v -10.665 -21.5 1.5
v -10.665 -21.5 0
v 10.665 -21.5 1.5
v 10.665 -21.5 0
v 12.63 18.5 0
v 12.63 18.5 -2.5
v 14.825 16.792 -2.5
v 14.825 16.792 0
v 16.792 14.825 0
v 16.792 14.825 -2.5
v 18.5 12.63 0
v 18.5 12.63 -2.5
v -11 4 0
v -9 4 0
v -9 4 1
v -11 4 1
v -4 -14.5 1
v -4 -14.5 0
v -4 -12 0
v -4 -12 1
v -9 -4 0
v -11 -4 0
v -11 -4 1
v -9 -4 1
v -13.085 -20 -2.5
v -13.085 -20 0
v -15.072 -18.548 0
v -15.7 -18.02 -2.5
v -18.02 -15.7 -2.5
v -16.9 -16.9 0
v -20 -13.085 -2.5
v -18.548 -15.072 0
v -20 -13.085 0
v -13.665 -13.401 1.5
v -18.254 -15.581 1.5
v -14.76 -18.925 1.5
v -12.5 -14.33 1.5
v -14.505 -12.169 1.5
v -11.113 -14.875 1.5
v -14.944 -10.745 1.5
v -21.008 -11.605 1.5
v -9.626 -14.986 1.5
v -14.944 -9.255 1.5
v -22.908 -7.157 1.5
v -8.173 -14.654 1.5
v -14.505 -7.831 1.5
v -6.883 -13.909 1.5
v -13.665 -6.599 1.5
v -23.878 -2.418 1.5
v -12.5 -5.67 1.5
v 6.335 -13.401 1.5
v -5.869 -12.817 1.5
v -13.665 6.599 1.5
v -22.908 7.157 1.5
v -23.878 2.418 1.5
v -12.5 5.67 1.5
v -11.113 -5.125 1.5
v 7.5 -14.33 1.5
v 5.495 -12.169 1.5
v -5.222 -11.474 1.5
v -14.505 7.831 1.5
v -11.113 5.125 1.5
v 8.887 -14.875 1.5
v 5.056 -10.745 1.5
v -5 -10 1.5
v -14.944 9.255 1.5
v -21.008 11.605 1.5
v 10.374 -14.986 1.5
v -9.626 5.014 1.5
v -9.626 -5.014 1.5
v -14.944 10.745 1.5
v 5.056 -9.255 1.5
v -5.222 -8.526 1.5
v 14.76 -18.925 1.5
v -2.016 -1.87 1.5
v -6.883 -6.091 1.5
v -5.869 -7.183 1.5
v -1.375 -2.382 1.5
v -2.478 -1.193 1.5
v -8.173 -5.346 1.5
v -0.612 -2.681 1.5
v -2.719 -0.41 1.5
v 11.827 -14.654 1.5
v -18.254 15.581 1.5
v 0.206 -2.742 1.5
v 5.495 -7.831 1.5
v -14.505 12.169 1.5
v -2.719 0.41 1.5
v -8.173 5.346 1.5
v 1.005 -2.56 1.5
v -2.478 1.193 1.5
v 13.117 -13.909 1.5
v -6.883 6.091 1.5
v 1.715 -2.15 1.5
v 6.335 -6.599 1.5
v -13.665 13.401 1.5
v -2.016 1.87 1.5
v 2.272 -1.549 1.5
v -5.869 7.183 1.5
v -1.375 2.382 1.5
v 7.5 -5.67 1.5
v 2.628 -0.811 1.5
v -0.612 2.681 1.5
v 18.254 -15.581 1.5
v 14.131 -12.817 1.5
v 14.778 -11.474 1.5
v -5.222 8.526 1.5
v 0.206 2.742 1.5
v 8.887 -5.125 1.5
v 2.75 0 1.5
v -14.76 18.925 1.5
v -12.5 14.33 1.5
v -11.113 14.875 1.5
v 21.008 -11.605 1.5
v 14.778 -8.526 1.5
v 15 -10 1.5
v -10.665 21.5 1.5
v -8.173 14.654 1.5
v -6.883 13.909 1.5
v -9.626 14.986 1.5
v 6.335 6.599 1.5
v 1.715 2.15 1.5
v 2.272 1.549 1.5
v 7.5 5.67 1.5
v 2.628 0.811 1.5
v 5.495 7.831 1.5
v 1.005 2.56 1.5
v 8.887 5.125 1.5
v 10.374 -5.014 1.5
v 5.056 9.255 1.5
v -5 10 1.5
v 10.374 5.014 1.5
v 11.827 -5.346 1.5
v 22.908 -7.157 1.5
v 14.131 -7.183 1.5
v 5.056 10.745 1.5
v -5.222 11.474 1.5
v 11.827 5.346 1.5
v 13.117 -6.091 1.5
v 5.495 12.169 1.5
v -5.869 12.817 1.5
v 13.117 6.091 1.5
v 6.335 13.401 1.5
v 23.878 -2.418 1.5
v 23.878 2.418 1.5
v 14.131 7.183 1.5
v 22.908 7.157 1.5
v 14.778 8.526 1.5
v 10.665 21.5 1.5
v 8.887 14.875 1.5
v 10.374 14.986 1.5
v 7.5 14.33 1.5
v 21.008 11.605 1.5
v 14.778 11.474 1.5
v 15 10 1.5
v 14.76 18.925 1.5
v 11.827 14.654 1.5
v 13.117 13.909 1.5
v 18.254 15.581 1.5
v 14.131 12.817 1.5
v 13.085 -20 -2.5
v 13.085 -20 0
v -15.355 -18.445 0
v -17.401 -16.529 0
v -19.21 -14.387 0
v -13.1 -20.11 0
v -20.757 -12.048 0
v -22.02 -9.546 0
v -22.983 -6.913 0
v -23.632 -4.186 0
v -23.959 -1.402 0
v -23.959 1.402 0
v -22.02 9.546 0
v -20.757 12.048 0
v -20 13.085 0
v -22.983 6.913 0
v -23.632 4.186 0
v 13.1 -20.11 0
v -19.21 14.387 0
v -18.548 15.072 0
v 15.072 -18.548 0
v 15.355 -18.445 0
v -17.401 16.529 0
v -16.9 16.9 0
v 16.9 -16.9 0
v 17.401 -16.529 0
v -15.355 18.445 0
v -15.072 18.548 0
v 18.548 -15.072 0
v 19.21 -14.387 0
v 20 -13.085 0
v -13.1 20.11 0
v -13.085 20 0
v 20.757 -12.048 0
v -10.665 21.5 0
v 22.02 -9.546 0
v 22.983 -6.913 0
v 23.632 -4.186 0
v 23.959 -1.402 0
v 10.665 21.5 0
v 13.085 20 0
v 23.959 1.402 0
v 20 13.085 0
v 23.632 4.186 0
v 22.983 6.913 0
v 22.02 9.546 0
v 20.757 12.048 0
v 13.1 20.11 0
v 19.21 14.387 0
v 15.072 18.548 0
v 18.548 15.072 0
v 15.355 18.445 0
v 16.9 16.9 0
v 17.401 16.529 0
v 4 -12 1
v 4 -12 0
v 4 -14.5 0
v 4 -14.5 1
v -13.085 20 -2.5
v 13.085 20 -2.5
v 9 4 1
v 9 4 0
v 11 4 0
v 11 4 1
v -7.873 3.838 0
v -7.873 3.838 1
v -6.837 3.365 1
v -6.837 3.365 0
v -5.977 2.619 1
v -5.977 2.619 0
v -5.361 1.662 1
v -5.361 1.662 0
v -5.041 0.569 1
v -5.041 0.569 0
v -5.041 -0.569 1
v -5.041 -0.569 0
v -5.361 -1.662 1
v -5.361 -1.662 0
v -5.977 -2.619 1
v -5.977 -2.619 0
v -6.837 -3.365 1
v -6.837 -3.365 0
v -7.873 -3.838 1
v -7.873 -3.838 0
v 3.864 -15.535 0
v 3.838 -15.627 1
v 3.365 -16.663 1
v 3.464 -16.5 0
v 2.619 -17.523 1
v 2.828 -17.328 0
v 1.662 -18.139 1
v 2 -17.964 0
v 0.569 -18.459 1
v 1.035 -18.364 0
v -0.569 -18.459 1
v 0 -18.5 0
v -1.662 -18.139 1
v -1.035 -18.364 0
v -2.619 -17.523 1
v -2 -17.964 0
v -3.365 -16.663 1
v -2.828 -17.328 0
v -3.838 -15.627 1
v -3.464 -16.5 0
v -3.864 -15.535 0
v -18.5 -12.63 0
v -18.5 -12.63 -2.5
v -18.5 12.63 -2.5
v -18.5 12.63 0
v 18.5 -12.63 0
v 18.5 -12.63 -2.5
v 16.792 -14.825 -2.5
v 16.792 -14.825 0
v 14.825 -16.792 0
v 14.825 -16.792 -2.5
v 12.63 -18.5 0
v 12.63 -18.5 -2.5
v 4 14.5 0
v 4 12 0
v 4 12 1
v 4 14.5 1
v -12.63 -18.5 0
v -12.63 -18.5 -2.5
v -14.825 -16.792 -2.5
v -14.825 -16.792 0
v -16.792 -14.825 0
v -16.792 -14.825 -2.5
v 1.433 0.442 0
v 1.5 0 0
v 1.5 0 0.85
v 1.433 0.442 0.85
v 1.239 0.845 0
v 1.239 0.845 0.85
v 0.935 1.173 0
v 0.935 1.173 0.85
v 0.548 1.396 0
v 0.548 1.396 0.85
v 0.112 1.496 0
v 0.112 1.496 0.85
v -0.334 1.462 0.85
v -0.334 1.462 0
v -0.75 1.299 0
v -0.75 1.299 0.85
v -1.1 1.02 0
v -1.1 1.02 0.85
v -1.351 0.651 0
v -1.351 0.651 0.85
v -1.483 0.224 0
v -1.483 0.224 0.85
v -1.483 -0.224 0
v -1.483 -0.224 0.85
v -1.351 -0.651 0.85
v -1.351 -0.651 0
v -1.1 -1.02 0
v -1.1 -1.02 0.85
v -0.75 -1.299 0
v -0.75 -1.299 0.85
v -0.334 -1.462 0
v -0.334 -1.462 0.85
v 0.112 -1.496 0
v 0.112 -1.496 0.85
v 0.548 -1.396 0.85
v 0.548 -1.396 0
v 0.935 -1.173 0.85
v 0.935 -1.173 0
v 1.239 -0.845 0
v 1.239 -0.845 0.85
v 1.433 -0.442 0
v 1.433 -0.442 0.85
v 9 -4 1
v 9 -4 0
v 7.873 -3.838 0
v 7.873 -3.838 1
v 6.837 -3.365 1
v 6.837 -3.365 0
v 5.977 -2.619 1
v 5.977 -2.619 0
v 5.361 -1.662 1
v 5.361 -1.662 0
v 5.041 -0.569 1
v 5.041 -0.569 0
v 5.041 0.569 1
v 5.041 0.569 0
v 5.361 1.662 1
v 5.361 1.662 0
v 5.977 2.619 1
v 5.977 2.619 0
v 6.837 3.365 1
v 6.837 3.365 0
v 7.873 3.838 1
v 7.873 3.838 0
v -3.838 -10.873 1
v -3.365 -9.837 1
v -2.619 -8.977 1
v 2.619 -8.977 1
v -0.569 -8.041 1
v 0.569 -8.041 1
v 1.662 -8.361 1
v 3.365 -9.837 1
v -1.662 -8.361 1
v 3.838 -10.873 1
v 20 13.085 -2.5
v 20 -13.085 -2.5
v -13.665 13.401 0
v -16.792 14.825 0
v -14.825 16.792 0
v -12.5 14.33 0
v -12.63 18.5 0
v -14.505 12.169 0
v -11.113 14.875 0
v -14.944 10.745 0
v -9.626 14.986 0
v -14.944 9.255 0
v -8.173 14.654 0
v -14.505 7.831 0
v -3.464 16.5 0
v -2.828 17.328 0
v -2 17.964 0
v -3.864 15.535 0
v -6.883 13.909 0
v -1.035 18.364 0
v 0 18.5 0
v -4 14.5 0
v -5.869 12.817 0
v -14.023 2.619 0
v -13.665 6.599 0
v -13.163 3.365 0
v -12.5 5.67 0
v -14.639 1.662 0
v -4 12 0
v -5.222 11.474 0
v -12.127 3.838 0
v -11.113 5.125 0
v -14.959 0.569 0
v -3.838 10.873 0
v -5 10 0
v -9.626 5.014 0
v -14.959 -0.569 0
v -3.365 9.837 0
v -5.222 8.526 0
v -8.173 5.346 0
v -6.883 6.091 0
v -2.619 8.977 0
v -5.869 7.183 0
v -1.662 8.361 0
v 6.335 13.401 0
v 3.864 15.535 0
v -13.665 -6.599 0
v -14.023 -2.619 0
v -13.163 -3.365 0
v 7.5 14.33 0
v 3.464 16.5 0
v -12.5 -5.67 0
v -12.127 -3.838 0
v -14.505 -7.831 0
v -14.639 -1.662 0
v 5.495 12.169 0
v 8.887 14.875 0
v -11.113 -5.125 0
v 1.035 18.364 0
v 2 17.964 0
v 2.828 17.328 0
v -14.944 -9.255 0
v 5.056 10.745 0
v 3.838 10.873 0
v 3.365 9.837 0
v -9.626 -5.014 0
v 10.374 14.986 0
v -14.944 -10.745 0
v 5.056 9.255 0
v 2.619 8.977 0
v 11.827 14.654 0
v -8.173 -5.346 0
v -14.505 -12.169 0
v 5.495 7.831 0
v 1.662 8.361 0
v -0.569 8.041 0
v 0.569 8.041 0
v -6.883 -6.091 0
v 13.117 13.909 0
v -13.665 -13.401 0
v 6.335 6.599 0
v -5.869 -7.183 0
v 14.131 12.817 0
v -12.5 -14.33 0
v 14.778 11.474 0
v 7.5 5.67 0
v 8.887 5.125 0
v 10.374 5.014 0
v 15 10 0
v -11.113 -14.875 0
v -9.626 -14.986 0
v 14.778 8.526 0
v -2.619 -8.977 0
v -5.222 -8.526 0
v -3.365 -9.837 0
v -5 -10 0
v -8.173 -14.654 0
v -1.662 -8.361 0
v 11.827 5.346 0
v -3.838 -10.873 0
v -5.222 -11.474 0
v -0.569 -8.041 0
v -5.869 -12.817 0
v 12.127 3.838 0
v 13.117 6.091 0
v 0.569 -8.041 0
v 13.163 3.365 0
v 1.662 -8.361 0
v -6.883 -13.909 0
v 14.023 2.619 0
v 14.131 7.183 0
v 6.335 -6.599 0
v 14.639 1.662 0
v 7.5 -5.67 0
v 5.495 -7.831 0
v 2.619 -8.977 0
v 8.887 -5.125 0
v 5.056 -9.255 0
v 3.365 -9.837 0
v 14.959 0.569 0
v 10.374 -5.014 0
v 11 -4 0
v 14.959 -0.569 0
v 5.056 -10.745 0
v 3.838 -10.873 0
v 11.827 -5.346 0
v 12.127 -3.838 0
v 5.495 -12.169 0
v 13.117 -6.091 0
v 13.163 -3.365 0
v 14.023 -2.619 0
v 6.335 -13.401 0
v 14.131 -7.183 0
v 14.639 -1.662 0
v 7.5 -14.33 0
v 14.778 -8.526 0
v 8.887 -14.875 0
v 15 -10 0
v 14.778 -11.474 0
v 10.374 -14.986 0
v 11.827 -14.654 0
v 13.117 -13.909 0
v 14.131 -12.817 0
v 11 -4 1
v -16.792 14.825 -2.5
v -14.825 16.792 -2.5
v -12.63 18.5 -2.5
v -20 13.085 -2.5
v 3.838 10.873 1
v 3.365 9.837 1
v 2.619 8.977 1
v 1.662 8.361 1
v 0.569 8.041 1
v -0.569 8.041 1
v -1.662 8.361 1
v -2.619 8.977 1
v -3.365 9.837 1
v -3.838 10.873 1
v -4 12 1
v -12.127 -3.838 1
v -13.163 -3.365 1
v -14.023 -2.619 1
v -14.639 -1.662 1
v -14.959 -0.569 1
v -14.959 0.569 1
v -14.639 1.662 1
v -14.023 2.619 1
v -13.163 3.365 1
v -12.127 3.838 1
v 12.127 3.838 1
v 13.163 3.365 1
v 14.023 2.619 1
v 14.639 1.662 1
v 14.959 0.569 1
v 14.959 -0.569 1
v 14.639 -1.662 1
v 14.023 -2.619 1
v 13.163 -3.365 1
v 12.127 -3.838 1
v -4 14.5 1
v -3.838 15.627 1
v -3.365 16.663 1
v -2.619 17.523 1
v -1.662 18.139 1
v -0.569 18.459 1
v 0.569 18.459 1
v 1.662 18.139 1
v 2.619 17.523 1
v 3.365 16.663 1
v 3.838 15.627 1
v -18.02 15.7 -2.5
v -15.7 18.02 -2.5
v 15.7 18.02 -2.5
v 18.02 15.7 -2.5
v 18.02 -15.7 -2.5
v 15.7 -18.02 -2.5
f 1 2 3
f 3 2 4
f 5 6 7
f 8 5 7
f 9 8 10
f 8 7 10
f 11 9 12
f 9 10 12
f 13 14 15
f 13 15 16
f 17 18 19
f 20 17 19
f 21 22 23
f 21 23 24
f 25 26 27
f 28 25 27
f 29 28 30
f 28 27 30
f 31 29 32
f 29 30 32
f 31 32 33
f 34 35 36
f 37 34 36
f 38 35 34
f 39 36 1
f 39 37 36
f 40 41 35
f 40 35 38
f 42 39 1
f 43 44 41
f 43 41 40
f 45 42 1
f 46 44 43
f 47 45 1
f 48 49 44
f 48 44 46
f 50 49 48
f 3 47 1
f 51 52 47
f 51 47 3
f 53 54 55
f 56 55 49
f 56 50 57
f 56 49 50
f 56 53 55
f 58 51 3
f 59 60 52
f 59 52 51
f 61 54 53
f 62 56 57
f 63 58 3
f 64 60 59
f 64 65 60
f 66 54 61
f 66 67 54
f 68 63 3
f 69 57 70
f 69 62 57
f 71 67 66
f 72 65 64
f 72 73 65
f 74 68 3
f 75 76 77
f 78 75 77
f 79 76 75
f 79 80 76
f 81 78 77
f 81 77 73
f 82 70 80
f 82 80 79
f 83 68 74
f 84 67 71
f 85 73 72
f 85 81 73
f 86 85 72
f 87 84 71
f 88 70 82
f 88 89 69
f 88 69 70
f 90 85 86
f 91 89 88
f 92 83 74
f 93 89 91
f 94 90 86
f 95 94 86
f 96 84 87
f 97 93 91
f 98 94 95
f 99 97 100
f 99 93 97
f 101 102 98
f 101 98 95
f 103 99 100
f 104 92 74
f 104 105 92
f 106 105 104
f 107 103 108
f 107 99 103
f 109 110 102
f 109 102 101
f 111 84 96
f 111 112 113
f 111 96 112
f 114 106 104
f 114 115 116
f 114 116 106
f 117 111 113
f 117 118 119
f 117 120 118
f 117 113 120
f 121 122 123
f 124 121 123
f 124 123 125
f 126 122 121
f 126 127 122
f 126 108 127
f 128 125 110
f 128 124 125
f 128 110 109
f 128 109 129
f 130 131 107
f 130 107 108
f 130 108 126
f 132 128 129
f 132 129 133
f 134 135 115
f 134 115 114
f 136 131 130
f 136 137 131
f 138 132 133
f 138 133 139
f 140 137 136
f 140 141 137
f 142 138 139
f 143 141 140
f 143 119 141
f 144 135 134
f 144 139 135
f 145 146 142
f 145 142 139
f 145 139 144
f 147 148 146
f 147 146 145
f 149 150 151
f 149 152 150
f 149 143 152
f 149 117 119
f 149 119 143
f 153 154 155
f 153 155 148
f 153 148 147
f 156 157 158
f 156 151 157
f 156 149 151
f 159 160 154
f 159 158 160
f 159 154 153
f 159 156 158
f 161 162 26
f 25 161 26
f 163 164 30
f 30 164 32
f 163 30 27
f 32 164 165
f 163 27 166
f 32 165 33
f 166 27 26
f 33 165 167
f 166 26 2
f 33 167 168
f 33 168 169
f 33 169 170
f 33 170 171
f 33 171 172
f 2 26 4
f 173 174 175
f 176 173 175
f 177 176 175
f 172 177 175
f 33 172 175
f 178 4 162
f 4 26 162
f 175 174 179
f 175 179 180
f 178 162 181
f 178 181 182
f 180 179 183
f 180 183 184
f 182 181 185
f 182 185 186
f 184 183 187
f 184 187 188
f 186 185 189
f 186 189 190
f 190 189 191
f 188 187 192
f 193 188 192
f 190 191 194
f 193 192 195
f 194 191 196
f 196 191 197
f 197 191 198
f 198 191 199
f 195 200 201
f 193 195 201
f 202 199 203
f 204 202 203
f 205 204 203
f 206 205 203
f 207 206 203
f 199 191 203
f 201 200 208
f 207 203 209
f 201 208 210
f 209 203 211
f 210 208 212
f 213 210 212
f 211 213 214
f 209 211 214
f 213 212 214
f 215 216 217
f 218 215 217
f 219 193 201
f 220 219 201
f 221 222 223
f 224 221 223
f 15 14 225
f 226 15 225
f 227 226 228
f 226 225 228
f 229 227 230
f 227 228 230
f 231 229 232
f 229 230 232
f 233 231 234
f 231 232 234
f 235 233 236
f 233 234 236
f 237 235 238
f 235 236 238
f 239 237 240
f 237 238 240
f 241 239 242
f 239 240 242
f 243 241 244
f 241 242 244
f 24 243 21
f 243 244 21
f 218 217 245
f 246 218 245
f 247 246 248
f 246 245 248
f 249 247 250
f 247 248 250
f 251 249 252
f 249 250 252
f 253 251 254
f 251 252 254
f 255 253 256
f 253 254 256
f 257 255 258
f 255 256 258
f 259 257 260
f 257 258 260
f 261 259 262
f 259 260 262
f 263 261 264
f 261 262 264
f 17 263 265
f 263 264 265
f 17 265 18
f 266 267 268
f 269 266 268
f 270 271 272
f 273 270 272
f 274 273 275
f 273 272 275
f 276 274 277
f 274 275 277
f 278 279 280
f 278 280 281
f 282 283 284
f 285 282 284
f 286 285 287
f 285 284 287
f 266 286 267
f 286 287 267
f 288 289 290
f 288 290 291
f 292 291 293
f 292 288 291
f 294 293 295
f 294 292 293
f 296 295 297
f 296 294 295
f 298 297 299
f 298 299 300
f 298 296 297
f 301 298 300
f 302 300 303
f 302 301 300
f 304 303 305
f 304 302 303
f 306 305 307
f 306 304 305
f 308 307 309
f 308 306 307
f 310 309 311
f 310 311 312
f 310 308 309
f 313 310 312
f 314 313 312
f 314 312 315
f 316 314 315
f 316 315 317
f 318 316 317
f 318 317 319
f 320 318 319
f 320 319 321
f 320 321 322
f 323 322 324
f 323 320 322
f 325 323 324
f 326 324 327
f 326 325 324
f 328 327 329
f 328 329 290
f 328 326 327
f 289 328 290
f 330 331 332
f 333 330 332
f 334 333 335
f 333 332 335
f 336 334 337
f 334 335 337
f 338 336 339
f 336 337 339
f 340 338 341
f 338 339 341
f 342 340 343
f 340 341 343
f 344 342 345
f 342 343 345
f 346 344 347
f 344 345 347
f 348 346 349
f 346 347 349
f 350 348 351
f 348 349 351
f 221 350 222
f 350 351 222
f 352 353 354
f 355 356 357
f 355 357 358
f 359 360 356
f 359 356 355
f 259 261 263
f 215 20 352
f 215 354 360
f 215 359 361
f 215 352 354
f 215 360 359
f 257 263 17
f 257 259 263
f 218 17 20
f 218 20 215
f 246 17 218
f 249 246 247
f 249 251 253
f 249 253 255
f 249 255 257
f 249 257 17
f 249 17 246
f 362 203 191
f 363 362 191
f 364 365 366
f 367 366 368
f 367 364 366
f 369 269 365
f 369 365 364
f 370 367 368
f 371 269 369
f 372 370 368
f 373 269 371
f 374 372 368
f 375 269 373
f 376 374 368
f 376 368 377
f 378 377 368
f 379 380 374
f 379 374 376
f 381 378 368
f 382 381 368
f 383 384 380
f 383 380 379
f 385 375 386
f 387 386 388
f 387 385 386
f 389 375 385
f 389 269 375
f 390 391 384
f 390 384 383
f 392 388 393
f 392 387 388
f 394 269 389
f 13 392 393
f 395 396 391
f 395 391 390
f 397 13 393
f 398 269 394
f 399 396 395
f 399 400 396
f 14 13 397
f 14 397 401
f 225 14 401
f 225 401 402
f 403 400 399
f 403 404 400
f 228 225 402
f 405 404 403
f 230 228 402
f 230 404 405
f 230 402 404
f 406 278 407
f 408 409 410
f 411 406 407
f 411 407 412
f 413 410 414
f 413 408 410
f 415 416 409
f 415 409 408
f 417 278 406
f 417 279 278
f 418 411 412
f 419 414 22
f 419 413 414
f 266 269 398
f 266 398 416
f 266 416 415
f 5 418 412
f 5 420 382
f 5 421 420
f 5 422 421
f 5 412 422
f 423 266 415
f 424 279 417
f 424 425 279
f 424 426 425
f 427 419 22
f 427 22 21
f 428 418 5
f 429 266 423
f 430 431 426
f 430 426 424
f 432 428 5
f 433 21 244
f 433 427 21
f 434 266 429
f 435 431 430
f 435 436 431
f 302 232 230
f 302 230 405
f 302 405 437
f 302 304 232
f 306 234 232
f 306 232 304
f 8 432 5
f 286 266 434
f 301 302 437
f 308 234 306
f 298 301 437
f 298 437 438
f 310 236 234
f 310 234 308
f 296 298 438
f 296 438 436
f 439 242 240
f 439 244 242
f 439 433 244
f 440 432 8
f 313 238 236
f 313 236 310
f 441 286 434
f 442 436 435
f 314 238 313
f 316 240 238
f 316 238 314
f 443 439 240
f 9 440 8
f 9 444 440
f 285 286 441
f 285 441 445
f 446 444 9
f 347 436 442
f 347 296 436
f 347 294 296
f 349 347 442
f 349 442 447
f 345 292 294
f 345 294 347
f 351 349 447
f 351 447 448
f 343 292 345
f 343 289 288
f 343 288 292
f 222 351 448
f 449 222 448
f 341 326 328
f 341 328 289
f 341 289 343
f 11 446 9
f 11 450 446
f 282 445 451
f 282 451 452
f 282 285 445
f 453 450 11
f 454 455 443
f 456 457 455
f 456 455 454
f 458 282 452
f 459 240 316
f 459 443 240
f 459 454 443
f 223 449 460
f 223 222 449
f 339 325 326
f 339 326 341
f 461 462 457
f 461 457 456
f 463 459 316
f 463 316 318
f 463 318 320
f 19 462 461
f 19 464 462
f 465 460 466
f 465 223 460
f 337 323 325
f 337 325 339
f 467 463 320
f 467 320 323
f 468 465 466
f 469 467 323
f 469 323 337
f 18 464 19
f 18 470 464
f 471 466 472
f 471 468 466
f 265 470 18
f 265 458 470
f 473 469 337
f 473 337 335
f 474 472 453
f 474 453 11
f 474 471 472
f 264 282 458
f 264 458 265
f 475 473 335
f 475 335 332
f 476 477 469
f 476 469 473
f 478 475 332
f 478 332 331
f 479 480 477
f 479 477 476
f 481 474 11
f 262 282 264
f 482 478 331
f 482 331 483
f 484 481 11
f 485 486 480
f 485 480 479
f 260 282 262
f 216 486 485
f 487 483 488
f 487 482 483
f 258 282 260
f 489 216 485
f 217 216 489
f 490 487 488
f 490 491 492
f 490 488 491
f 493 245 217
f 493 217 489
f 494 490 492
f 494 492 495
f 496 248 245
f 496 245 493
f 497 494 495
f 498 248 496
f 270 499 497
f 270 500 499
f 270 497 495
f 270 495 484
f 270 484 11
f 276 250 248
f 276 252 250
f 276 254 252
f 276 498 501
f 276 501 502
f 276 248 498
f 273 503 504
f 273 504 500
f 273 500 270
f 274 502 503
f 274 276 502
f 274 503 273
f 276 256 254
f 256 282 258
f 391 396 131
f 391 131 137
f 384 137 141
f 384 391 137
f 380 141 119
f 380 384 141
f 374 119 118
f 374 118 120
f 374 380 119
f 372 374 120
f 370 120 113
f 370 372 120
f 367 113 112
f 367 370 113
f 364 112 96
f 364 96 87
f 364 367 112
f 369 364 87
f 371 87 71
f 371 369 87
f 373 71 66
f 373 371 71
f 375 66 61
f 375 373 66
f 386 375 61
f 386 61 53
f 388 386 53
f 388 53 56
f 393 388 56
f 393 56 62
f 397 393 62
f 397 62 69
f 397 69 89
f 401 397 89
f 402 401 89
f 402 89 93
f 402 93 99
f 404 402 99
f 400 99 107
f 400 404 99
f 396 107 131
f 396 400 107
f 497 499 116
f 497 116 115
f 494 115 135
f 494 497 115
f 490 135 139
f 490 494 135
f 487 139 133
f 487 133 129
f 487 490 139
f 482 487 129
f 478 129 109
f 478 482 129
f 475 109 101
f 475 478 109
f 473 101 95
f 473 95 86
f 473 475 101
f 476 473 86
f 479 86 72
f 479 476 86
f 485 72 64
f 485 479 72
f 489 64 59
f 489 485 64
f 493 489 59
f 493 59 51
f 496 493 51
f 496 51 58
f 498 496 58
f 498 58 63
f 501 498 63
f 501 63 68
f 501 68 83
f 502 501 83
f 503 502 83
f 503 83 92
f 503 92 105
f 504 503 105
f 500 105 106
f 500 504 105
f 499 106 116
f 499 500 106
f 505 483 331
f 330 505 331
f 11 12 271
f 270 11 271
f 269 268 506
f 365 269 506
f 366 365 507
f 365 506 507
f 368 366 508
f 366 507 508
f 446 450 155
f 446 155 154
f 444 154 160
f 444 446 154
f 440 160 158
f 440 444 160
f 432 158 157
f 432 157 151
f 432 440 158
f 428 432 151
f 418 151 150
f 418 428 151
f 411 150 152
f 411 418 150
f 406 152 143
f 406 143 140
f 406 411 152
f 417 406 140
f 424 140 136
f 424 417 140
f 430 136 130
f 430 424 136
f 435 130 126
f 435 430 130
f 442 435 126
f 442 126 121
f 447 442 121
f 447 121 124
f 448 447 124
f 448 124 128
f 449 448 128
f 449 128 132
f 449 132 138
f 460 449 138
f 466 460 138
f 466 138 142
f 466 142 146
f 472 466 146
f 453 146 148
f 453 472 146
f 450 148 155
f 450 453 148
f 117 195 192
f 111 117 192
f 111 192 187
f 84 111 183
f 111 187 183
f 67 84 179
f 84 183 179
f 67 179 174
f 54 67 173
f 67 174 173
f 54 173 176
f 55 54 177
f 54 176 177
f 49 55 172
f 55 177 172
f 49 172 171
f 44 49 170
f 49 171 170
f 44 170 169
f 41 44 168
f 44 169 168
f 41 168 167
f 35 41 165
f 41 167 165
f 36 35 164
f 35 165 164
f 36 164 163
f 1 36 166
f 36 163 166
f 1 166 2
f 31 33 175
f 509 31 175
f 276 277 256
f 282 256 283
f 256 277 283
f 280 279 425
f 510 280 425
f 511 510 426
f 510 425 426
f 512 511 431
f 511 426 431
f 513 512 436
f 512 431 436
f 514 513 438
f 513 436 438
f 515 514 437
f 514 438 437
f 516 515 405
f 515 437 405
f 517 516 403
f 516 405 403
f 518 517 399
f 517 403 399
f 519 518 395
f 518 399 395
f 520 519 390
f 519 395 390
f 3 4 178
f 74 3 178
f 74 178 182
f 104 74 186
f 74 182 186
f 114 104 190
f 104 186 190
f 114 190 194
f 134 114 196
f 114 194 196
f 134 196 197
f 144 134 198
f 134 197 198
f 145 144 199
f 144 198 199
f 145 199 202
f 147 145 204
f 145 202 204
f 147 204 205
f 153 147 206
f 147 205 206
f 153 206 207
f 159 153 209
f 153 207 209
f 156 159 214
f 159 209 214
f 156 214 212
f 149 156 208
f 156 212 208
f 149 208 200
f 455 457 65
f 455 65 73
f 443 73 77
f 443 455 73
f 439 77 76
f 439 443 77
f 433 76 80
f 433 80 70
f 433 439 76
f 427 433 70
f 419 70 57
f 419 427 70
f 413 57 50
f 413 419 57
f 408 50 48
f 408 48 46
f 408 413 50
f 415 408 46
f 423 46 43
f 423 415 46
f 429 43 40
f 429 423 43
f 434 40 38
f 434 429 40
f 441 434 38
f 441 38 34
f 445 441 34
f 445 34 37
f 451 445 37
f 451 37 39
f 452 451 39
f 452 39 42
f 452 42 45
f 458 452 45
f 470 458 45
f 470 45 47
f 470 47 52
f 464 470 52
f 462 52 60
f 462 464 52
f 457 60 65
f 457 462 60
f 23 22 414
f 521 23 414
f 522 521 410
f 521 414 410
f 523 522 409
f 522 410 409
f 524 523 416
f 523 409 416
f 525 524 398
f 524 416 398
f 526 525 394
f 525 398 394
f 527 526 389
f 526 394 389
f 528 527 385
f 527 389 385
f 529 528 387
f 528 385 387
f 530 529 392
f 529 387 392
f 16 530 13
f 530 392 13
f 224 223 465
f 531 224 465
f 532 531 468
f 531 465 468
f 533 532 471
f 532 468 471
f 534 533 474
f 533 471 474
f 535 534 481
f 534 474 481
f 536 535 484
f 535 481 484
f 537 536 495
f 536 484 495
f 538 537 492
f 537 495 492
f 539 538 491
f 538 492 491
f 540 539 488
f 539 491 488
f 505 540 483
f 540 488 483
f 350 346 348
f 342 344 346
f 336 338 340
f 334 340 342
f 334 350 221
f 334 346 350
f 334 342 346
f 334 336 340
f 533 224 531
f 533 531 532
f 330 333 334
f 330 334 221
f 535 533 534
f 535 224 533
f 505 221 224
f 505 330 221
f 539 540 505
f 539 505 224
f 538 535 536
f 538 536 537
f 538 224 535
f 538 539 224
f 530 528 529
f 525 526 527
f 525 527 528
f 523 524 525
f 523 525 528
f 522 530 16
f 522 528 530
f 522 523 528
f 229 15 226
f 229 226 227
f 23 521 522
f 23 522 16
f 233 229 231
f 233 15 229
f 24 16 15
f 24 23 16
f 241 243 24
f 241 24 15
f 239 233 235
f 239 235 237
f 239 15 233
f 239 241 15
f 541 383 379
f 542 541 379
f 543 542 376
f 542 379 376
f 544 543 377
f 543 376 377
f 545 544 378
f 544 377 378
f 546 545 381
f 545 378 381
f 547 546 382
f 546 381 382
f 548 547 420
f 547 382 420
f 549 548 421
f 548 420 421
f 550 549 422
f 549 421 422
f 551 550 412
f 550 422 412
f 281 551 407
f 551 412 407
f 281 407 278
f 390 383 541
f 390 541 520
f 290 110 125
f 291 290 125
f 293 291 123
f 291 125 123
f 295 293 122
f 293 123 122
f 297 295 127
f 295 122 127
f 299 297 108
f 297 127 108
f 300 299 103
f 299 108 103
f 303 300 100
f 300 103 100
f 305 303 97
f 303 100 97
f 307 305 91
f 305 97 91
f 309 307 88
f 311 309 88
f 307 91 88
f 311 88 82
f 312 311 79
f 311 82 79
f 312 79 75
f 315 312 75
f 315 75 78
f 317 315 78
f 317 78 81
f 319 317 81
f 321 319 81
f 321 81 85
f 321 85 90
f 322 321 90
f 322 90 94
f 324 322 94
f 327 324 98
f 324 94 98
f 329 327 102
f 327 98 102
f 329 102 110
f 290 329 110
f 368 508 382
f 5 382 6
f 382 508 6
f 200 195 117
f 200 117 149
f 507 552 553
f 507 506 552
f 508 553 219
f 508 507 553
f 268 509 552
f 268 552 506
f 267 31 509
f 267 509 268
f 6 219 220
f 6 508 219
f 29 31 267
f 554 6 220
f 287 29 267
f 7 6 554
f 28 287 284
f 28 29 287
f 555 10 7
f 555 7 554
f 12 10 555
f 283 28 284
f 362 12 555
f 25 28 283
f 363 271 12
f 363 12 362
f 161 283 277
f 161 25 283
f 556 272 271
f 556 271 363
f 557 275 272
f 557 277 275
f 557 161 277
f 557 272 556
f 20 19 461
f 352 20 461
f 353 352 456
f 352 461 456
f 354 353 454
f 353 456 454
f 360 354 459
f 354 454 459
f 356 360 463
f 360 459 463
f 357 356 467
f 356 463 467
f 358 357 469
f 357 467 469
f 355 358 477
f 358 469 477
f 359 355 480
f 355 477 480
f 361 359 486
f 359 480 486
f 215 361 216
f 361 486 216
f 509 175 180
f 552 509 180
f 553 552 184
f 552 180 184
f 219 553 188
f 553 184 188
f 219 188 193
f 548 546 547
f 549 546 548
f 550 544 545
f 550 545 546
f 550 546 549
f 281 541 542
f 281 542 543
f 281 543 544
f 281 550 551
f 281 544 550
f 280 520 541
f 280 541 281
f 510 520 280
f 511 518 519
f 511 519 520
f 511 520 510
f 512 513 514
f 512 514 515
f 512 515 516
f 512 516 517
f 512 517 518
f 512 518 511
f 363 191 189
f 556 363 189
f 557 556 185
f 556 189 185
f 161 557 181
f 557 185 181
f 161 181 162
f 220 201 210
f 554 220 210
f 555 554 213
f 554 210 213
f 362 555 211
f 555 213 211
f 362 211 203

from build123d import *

# Parameters (mm, degrees)
SKETCH_R        = 5
SKETCH_R_2      = 1.5
PAD_DEPTH       = 1.5
CHAMFER_SIZE2   = 1.25
CHAMFER_SIZE    = 0.65
POCKET_DEPTH    = 1
PAD001_DEPTH    = 2.5
POCKET001_DEPTH = 2.5


with BuildPart() as part:
    # Sketch → Pad (new body)
    with BuildSketch(Plane.XY):
        with BuildLine():
            ThreePointArc((10.665365, -21.5), (24, 0), (10.665365, 21.5))
            Line((-10.665365, 21.5), (10.665365, 21.5))
            ThreePointArc((-10.665365, 21.5), (-24, 0), (-10.665365, -21.5))
            Line((-10.665365, -21.5), (10.665365, -21.5))
        make_face()
        with Locations((10, -10)):
            Circle(SKETCH_R, mode=Mode.SUBTRACT)
        with Locations((-10, -10)):
            Circle(SKETCH_R, mode=Mode.SUBTRACT)
        with Locations((-10, 10)):
            Circle(SKETCH_R, mode=Mode.SUBTRACT)
        with Locations((10, 10)):
            Circle(SKETCH_R, mode=Mode.SUBTRACT)
        Circle(SKETCH_R_2, mode=Mode.SUBTRACT)
    extrude(amount=PAD_DEPTH)

    # Chamfer
    chamfer_edges = [part.edges().sort_by_distance(p)[0] for p in [
        (-1.5, 0, 1.5),
    ]]
    chamfer_side = part.faces().sort_by_distance((-1.5, 0, 0.75))[0]
    chamfer(chamfer_edges, length=CHAMFER_SIZE, length2=CHAMFER_SIZE2, reference=chamfer_side)

    # Sketch001 (on Face3 of Chamfer) → Pocket (cut)
    with BuildSketch(Plane(origin=(0, 0, 0), x_dir=(1, 0, 0), z_dir=(0, 0, -1))):
        with BuildLine():
            ThreePointArc((4, 14.5), (0, 18.5), (-4, 14.5))
            Line((-4, 14.5), (-4, 12))
            ThreePointArc((-4, 12), (0, 8), (4, 12))
            Line((4, 12), (4, 14.5))
        make_face()
        with BuildLine():
            ThreePointArc((-4, -14.5), (0, -18.5), (4, -14.5))
            Line((4, -12), (4, -14.5))
            ThreePointArc((4, -12), (0, -8), (-4, -12))
            Line((-4, -14.5), (-4, -12))
        make_face()
        with BuildLine():
            ThreePointArc((9, 4), (5, 0), (9, -4))
            Line((9, -4), (11, -4))
            ThreePointArc((11, -4), (15, 0), (11, 4))
            Line((11, 4), (9, 4))
        make_face()
        with BuildLine():
            ThreePointArc((-9, -4), (-5, 0), (-9, 4))
            Line((-11, 4), (-9, 4))
            ThreePointArc((-11, 4), (-15, 0), (-11, -4))
            Line((-9, -4), (-11, -4))
        make_face()
    extrude(amount=-POCKET_DEPTH, mode=Mode.SUBTRACT)

    # Sketch002 (on Face3 of Pocket) → Pad001 (join)
    with BuildSketch(Plane(origin=(0, 0, 0), x_dir=(1, 0, 0), z_dir=(0, 0, -1))):
        with BuildLine():
            Line((-20, 13.084724), (-20, -13.084724))
            ThreePointArc((-20, -13.084724), (-16.899852, -16.899852), (-13.084724, -20))
            Line((-13.084724, -20), (13.084724, -20))
            ThreePointArc((13.084724, -20), (16.899852, -16.899852), (20, -13.084724))
            Line((20, -13.084724), (20, 13.084724))
            ThreePointArc((20, 13.084724), (16.899852, 16.899852), (13.084724, 20))
            Line((13.084724, 20), (-13.084724, 20))
            ThreePointArc((-13.084724, 20), (-16.899852, 16.899852), (-20, 13.084724))
        make_face()
    extrude(amount=PAD001_DEPTH)

    # Sketch003 (on Face26 of Pad001) → Pocket001 (cut)
    with BuildSketch(Plane(origin=(0, 0, -2.5), x_dir=(1, 0, 0), z_dir=(0, 0, -1))):
        with BuildLine():
            Line((-18.5, 12.629727), (-18.5, -12.629727))
            ThreePointArc((-18.5, -12.629727), (-15.839192, -15.839192), (-12.629727, -18.5))
            Line((-12.629727, -18.5), (12.629727, -18.5))
            ThreePointArc((12.629727, -18.5), (15.839192, -15.839192), (18.5, -12.629727))
            Line((18.5, -12.629727), (18.5, 12.629727))
            ThreePointArc((18.5, 12.629727), (15.839192, 15.839192), (12.629727, 18.5))
            Line((12.629727, 18.5), (-12.629727, 18.5))
            ThreePointArc((-12.629727, 18.5), (-15.839192, 15.839192), (-18.5, 12.629727))
        make_face()
    extrude(amount=-POCKET001_DEPTH, mode=Mode.SUBTRACT)


solid = part.part
